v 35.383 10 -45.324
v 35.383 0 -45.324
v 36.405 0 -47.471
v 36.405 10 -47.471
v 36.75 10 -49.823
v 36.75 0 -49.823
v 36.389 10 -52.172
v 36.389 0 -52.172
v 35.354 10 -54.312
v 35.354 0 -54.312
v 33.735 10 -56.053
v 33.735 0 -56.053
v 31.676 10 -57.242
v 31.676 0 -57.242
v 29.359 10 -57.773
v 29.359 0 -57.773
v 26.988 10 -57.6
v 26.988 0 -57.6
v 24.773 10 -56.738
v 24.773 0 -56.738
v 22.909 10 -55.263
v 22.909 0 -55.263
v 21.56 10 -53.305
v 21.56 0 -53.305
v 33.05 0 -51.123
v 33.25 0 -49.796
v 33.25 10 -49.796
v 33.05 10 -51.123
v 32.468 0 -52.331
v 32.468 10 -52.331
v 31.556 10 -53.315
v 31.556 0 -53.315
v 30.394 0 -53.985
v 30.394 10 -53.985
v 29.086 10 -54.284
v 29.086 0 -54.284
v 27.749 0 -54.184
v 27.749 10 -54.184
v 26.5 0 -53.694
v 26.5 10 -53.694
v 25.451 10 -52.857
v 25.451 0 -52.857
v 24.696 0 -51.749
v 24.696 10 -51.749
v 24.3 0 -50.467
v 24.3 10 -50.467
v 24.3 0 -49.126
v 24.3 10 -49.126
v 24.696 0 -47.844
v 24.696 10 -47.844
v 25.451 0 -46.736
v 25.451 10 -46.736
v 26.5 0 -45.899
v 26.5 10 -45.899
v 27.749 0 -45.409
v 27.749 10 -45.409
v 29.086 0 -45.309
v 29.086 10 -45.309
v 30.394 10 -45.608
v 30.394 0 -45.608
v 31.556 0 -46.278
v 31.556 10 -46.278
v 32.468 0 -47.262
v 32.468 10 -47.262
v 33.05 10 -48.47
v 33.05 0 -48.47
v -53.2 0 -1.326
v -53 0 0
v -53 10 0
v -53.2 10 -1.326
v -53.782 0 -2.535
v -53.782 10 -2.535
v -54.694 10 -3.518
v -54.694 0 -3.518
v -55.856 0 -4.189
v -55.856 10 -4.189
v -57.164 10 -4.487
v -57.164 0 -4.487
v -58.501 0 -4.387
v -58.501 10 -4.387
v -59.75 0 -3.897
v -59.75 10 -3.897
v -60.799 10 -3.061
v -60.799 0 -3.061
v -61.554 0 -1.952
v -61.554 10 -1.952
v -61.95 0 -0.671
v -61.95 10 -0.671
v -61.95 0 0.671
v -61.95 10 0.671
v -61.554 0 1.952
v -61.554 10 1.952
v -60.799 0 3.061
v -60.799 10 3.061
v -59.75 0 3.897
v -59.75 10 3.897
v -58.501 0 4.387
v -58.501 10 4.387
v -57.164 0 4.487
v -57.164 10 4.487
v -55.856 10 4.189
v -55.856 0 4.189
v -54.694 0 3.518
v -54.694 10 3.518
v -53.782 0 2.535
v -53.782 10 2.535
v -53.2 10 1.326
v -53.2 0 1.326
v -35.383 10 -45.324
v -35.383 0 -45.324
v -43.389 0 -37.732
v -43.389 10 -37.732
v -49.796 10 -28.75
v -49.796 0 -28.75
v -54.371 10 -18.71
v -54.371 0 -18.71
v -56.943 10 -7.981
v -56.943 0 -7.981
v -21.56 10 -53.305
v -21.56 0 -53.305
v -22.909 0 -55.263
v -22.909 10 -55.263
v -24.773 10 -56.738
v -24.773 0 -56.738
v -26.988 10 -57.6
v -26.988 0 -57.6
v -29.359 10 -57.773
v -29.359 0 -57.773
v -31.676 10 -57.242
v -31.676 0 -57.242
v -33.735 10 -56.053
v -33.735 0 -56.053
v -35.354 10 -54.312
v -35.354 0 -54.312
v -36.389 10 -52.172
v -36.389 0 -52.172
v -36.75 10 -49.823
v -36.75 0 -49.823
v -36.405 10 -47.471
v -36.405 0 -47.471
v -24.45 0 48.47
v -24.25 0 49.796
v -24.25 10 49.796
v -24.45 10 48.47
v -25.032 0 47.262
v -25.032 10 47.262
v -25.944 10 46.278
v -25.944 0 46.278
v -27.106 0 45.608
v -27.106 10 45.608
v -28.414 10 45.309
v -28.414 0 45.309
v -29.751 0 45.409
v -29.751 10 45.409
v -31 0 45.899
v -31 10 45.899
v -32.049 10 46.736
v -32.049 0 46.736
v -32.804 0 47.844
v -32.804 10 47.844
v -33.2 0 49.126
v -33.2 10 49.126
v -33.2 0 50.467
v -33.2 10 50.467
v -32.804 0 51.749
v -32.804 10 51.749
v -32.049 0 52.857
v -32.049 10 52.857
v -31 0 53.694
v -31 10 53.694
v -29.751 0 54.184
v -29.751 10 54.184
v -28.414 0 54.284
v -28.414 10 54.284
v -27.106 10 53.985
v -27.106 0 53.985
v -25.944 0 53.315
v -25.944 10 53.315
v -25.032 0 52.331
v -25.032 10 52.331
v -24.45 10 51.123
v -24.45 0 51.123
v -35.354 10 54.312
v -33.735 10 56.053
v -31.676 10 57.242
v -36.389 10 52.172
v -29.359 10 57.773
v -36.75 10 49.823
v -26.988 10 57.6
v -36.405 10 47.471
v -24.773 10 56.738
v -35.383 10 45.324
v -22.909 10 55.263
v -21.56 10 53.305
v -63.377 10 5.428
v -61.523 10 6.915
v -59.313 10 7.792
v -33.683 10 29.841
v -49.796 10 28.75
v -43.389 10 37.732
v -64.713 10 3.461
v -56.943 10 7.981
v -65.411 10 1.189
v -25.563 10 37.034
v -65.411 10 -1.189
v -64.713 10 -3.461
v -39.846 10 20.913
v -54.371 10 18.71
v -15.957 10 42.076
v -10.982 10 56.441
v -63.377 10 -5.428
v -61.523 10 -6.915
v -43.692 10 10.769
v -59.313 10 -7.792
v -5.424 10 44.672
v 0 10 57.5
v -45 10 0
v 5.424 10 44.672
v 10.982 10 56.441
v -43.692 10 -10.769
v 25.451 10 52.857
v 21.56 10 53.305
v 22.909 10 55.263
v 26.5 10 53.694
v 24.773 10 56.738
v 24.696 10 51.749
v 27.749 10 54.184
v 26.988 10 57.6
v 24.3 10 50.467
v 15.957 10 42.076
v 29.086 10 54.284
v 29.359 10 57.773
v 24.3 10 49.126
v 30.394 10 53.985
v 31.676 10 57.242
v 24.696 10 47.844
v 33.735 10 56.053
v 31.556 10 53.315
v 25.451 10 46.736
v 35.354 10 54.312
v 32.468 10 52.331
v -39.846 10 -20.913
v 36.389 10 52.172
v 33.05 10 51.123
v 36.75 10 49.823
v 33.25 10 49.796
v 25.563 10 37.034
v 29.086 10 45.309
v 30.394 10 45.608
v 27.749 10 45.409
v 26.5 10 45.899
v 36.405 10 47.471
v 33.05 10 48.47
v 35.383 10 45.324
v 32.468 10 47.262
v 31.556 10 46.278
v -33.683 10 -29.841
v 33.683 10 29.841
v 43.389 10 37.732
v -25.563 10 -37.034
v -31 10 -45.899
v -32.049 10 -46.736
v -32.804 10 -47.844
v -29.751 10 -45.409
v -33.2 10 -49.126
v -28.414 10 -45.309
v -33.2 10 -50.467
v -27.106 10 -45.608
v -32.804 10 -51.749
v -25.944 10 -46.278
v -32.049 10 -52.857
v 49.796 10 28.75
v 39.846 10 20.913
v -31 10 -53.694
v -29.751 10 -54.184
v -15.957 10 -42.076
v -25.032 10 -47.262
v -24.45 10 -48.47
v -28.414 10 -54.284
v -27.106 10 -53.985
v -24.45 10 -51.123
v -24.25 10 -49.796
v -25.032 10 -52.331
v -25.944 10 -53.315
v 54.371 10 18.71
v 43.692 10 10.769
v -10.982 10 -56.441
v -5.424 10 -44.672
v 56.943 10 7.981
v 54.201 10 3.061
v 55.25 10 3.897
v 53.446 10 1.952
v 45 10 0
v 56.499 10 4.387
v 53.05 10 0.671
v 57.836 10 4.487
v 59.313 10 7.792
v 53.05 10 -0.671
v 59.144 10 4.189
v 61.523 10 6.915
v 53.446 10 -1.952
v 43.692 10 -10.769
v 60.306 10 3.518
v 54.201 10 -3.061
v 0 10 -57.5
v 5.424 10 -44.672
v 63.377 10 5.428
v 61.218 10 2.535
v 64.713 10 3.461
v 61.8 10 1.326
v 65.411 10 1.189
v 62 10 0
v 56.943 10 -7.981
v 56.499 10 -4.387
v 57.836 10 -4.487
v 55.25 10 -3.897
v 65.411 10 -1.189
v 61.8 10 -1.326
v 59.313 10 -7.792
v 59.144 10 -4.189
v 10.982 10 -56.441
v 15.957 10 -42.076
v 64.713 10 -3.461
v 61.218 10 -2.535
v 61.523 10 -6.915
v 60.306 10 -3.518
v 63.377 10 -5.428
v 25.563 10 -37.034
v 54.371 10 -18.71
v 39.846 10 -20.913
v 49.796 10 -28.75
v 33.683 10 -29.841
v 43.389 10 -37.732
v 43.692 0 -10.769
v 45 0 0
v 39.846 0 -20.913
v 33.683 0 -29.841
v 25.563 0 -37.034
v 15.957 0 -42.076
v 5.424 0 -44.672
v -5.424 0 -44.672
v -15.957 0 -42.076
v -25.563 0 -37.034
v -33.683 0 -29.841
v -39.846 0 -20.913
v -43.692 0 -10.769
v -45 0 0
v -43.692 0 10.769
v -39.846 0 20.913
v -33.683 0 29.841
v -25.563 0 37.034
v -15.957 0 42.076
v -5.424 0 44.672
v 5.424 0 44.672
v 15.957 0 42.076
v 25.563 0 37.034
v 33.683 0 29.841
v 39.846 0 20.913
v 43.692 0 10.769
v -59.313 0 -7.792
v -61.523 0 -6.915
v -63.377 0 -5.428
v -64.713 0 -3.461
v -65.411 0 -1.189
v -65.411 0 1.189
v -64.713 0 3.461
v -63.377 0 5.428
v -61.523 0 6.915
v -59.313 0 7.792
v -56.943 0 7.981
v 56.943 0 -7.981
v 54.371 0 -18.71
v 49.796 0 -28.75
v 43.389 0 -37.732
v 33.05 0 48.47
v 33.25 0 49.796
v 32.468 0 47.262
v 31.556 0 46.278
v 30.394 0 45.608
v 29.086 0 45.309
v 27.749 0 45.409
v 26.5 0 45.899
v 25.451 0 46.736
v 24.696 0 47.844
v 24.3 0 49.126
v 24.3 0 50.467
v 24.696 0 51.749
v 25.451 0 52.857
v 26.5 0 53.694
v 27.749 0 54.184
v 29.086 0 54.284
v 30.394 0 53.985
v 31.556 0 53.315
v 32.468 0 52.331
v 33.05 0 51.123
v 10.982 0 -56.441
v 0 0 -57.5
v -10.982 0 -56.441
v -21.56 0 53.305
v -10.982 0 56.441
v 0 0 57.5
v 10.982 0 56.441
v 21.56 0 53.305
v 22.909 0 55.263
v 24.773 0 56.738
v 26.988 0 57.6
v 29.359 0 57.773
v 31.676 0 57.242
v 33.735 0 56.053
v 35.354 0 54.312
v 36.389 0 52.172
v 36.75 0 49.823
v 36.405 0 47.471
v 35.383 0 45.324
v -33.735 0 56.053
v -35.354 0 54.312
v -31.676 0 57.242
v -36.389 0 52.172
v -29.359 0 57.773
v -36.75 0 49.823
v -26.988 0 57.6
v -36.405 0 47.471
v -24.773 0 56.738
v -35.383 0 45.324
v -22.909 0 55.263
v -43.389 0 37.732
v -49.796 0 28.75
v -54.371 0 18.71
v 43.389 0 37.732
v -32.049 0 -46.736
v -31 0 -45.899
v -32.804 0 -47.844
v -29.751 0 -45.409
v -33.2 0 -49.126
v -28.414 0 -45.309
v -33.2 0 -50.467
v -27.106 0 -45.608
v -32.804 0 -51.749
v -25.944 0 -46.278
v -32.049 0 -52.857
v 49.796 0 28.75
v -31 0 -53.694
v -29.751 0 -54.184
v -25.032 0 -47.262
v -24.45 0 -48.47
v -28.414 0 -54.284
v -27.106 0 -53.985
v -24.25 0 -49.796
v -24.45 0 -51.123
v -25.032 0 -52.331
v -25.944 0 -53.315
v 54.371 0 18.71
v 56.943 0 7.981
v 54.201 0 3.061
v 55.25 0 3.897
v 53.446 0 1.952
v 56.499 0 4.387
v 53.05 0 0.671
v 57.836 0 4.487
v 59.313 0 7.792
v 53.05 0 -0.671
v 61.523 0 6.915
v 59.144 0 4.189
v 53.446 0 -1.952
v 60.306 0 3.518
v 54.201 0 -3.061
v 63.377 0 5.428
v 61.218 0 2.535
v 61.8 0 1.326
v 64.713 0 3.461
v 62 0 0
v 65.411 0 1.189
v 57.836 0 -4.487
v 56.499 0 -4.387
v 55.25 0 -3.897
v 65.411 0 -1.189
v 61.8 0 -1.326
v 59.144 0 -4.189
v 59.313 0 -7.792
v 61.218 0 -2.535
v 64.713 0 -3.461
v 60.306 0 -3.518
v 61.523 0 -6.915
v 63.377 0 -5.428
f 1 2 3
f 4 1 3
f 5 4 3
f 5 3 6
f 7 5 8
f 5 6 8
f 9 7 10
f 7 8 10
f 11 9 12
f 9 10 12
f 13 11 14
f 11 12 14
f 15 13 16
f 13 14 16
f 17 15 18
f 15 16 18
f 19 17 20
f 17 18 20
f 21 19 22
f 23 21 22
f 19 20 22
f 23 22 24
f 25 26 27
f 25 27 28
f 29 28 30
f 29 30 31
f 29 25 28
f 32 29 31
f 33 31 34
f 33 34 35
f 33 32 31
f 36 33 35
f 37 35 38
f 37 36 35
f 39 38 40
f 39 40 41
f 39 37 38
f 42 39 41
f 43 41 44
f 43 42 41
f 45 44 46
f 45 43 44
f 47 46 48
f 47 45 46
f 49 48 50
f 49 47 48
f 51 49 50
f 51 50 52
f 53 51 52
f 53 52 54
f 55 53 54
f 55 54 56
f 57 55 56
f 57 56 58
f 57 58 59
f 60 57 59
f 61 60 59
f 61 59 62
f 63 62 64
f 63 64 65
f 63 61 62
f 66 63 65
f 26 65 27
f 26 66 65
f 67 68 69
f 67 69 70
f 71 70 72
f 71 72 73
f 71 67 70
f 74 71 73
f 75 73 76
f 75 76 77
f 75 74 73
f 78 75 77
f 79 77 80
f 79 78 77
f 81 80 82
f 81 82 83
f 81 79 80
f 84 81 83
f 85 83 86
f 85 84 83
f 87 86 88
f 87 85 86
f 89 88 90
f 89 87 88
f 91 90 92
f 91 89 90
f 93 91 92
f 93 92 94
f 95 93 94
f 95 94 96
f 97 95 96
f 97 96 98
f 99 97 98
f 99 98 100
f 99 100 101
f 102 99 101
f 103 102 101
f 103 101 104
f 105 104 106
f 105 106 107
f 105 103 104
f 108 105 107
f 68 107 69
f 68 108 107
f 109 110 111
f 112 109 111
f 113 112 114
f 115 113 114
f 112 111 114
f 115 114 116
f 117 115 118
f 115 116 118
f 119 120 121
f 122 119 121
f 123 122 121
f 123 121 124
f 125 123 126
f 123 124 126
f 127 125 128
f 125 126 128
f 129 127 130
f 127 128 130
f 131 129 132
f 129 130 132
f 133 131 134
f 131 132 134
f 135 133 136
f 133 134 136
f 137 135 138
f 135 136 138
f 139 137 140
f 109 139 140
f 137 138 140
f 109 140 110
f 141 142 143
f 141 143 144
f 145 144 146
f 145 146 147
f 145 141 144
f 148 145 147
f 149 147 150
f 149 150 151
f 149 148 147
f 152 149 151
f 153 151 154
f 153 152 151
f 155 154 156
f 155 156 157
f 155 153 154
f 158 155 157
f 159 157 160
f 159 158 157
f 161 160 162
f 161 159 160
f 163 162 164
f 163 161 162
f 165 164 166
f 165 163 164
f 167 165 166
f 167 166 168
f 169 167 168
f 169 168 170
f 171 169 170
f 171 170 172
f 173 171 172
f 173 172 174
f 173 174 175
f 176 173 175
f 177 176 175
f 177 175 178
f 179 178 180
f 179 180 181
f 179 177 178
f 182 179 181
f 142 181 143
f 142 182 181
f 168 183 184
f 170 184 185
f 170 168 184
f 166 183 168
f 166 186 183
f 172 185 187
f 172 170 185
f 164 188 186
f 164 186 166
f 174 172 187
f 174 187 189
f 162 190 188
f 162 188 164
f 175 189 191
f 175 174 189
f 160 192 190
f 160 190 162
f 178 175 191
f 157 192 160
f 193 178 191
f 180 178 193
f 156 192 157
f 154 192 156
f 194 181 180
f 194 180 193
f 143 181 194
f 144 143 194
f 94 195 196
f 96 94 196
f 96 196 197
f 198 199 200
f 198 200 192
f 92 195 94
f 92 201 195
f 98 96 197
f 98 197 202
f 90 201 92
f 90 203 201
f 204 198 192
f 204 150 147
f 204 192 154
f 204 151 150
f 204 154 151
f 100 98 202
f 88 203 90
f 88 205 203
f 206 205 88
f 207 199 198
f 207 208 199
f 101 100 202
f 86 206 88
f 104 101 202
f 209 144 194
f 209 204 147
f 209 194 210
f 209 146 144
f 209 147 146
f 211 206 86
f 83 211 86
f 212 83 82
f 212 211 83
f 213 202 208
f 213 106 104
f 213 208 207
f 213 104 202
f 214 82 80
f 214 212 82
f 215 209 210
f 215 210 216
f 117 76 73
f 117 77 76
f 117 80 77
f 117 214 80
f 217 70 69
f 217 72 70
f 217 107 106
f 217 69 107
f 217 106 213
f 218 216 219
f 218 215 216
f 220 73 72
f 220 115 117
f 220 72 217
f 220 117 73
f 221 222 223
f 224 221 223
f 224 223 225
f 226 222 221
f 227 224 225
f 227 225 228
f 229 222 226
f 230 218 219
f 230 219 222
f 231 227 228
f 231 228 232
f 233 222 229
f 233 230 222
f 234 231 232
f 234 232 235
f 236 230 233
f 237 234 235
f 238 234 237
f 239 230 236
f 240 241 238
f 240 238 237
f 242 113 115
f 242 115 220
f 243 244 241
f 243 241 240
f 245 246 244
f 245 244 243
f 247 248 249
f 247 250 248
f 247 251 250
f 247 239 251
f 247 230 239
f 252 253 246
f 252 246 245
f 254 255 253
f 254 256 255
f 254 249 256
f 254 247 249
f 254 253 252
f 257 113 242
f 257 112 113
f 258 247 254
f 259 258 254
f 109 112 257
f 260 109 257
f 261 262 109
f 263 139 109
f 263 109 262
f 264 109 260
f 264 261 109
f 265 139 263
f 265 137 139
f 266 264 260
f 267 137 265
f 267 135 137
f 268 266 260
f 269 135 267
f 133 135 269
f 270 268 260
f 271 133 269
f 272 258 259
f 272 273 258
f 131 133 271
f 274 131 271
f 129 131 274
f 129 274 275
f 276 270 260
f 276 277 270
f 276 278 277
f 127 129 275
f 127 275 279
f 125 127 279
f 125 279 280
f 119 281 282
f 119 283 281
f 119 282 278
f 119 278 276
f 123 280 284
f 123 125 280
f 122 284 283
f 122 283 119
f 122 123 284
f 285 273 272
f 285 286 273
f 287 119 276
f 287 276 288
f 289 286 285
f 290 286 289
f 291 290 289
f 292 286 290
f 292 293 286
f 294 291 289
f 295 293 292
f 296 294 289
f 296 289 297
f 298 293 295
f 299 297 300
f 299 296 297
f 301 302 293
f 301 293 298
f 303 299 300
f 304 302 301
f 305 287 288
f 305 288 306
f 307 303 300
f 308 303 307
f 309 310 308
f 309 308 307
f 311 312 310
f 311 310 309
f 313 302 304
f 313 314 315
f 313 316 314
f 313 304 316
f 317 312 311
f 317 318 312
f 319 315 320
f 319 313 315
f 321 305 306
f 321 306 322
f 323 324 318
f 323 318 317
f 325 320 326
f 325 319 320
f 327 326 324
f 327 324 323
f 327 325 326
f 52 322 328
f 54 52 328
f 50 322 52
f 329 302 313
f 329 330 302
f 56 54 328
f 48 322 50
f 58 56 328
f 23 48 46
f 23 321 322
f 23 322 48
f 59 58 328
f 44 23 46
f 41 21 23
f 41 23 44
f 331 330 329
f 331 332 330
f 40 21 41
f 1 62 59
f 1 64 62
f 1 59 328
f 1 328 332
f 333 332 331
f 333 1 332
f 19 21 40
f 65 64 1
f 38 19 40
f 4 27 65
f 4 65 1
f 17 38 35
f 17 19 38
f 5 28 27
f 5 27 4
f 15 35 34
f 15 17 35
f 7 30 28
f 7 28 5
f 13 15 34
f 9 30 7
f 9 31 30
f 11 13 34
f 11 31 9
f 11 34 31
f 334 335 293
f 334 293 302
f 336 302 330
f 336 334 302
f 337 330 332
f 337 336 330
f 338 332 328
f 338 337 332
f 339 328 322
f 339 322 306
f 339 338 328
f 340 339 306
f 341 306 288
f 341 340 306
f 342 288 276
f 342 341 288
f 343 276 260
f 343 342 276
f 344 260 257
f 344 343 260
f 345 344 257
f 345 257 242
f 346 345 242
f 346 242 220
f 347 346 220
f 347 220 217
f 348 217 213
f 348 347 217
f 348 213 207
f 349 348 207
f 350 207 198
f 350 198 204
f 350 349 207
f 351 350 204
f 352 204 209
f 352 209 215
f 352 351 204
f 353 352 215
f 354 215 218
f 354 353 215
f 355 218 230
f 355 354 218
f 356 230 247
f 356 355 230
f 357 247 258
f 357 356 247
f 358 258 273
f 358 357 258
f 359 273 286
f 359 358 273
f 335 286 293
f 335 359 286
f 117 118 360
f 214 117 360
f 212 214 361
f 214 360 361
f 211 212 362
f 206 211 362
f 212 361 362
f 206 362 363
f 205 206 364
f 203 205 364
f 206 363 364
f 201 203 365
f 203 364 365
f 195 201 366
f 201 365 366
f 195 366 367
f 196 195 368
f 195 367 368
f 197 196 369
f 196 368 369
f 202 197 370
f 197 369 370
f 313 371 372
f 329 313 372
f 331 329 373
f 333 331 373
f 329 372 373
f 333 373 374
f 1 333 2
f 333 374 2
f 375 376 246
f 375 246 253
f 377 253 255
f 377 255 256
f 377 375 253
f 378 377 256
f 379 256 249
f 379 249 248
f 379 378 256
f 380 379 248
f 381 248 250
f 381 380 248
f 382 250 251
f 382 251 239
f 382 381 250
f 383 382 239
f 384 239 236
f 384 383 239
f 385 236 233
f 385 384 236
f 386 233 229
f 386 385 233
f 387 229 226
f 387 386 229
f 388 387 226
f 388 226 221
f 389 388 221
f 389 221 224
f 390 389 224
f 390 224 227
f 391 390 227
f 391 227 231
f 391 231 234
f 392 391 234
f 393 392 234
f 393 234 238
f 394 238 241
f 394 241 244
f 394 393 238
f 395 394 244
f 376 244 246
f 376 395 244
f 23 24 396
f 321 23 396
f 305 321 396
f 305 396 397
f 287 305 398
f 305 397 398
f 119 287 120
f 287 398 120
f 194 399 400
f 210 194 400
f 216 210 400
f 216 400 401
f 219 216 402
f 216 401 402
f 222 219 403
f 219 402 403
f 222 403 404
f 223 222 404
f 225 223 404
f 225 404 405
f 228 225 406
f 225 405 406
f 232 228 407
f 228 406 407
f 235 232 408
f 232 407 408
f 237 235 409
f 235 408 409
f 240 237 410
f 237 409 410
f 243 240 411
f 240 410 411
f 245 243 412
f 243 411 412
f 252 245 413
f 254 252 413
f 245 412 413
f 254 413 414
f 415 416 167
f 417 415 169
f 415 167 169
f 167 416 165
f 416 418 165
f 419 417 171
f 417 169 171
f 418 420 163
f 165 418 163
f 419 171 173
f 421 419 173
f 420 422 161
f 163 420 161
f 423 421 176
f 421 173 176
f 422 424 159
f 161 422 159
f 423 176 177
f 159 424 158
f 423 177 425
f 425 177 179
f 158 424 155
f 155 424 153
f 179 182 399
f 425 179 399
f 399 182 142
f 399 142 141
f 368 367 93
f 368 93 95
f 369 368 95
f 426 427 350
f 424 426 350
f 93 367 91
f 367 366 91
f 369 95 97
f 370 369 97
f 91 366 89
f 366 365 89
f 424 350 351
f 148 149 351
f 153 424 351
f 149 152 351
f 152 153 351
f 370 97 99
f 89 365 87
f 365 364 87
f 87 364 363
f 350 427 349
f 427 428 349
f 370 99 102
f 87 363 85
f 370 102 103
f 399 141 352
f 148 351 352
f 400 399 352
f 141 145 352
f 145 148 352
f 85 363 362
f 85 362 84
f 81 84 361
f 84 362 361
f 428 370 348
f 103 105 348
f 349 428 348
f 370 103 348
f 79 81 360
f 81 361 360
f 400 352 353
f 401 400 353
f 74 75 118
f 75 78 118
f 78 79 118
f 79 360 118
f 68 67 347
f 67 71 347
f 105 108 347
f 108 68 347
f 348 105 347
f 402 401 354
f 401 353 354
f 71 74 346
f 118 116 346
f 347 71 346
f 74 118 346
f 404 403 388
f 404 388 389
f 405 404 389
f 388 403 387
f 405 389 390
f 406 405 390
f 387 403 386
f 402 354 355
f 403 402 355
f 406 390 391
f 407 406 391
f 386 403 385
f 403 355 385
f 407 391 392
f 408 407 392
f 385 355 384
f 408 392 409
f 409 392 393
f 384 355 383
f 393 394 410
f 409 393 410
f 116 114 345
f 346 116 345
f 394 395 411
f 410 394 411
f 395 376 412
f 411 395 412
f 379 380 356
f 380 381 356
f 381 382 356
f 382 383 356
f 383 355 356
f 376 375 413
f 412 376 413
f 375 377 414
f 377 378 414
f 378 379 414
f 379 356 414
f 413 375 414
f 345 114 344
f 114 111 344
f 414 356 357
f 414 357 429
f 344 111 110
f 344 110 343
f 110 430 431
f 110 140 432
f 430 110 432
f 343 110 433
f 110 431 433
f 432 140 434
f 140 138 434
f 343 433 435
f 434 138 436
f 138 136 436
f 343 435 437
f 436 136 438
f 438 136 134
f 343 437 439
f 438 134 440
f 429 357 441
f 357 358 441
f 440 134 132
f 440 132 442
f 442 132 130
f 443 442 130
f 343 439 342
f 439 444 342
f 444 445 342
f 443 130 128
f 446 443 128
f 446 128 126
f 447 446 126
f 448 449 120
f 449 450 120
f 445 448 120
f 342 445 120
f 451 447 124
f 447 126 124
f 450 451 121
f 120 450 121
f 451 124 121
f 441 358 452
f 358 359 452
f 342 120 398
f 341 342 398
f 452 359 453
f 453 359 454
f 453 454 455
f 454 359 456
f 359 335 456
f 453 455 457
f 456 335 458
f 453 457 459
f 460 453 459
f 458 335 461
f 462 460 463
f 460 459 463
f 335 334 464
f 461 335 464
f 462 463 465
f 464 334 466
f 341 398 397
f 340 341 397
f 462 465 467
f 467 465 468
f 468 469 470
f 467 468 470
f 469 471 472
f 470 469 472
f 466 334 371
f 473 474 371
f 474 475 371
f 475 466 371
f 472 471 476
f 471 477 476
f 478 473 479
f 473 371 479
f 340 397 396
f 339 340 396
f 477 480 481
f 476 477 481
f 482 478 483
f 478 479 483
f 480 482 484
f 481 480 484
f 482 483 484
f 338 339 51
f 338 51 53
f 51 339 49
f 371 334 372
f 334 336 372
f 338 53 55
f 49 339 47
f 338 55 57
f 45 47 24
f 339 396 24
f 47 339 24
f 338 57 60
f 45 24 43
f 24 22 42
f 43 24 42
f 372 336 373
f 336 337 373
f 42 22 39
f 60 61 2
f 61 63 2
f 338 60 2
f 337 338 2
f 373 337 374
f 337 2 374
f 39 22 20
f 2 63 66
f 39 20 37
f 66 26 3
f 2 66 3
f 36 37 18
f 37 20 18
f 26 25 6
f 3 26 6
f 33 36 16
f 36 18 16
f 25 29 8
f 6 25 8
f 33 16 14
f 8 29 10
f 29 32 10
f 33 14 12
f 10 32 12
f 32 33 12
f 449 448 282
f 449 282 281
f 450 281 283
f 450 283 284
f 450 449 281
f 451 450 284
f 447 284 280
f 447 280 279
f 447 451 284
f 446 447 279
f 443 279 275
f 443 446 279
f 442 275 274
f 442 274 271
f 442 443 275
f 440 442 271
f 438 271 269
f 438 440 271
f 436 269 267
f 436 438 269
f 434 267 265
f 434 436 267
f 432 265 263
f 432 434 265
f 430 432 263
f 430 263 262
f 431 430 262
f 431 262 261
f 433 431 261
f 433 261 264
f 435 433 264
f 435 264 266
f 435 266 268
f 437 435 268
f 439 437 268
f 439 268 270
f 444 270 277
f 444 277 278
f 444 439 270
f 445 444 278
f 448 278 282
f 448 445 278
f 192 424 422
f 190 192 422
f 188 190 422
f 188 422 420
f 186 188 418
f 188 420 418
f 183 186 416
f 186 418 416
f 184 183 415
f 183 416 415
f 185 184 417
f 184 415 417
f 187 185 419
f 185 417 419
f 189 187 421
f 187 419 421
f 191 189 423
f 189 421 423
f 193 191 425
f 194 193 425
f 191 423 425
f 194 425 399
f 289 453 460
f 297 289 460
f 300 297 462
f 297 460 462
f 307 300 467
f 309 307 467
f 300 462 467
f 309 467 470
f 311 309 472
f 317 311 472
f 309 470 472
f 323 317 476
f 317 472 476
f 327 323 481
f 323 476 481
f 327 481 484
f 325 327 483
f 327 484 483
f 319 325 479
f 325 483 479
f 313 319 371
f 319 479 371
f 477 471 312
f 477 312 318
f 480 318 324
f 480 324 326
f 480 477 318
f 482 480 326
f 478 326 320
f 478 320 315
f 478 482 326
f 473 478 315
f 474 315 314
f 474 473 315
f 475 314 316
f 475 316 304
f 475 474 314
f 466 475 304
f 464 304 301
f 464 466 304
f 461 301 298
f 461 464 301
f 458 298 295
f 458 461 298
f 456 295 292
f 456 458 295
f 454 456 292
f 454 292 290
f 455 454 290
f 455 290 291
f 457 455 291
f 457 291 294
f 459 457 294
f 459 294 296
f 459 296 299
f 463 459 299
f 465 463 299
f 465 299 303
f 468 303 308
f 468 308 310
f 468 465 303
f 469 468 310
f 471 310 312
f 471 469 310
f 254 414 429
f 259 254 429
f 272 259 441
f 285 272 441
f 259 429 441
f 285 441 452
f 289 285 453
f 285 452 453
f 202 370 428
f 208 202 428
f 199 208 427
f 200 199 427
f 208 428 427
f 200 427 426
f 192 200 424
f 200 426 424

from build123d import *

# Parameters (mm, degrees)
SKETCH2_R           = 45
SKETCH2_R_2         = 4.5
BOSS_EXTRUDE1_DEPTH = 10


with BuildPart() as part:
    # Sketch2 → Boss-Extrude1 (new body)
    with BuildSketch(Plane(origin=(0, 0, 0), x_dir=(1, 0, 0), z_dir=(0, 1, 0))):
        with BuildLine():
            ThreePointArc((56.943478261, 7.980619246), (49.796460718, 28.75), (35.383158136, 45.324189131))
            ThreePointArc((35.383158136, 45.324189131), (32.75, 56.724663948), (21.560320125, 53.304808377))
            ThreePointArc((21.560320125, 53.304808377), (0, 57.5), (-21.560320125, 53.304808377))
            ThreePointArc((-21.560320125, 53.304808377), (-32.75, 56.724663948), (-35.383158136, 45.324189131))
            ThreePointArc((-35.383158136, 45.324189131), (-49.796460718, 28.75), (-56.943478261, 7.980619246))
            ThreePointArc((-56.943478261, 7.980619246), (-65.5, 0), (-56.943478261, -7.980619246))
            ThreePointArc((-56.943478261, -7.980619246), (-49.796460718, -28.75), (-35.383158136, -45.324189131))
            ThreePointArc((-35.383158136, -45.324189131), (-32.75, -56.724663948), (-21.560320125, -53.304808377))
            ThreePointArc((-21.560320125, -53.304808377), (0, -57.5), (21.560320125, -53.304808377))
            ThreePointArc((21.560320125, -53.304808377), (32.75, -56.724663948), (35.383158136, -45.324189131))
            ThreePointArc((35.383158136, -45.324189131), (49.796460718, -28.75), (56.943478261, -7.980619246))
            ThreePointArc((56.943478261, -7.980619246), (65.5, 0), (56.943478261, 7.980619246))
        make_face()
        Circle(SKETCH2_R, mode=Mode.SUBTRACT)
        with Locations((28.75, 49.796460718)):
            Circle(SKETCH2_R_2, mode=Mode.SUBTRACT)
        with Locations((-28.75, 49.796460718)):
            Circle(SKETCH2_R_2, mode=Mode.SUBTRACT)
        with Locations((57.5, 0)):
            Circle(SKETCH2_R_2, mode=Mode.SUBTRACT)
        with Locations((-57.5, 0)):
            Circle(SKETCH2_R_2, mode=Mode.SUBTRACT)
        with Locations((28.75, -49.796460718)):
            Circle(SKETCH2_R_2, mode=Mode.SUBTRACT)
        with Locations((-28.75, -49.796460718)):
            Circle(SKETCH2_R_2, mode=Mode.SUBTRACT)
    extrude(amount=BOSS_EXTRUDE1_DEPTH)


solid = part.part
